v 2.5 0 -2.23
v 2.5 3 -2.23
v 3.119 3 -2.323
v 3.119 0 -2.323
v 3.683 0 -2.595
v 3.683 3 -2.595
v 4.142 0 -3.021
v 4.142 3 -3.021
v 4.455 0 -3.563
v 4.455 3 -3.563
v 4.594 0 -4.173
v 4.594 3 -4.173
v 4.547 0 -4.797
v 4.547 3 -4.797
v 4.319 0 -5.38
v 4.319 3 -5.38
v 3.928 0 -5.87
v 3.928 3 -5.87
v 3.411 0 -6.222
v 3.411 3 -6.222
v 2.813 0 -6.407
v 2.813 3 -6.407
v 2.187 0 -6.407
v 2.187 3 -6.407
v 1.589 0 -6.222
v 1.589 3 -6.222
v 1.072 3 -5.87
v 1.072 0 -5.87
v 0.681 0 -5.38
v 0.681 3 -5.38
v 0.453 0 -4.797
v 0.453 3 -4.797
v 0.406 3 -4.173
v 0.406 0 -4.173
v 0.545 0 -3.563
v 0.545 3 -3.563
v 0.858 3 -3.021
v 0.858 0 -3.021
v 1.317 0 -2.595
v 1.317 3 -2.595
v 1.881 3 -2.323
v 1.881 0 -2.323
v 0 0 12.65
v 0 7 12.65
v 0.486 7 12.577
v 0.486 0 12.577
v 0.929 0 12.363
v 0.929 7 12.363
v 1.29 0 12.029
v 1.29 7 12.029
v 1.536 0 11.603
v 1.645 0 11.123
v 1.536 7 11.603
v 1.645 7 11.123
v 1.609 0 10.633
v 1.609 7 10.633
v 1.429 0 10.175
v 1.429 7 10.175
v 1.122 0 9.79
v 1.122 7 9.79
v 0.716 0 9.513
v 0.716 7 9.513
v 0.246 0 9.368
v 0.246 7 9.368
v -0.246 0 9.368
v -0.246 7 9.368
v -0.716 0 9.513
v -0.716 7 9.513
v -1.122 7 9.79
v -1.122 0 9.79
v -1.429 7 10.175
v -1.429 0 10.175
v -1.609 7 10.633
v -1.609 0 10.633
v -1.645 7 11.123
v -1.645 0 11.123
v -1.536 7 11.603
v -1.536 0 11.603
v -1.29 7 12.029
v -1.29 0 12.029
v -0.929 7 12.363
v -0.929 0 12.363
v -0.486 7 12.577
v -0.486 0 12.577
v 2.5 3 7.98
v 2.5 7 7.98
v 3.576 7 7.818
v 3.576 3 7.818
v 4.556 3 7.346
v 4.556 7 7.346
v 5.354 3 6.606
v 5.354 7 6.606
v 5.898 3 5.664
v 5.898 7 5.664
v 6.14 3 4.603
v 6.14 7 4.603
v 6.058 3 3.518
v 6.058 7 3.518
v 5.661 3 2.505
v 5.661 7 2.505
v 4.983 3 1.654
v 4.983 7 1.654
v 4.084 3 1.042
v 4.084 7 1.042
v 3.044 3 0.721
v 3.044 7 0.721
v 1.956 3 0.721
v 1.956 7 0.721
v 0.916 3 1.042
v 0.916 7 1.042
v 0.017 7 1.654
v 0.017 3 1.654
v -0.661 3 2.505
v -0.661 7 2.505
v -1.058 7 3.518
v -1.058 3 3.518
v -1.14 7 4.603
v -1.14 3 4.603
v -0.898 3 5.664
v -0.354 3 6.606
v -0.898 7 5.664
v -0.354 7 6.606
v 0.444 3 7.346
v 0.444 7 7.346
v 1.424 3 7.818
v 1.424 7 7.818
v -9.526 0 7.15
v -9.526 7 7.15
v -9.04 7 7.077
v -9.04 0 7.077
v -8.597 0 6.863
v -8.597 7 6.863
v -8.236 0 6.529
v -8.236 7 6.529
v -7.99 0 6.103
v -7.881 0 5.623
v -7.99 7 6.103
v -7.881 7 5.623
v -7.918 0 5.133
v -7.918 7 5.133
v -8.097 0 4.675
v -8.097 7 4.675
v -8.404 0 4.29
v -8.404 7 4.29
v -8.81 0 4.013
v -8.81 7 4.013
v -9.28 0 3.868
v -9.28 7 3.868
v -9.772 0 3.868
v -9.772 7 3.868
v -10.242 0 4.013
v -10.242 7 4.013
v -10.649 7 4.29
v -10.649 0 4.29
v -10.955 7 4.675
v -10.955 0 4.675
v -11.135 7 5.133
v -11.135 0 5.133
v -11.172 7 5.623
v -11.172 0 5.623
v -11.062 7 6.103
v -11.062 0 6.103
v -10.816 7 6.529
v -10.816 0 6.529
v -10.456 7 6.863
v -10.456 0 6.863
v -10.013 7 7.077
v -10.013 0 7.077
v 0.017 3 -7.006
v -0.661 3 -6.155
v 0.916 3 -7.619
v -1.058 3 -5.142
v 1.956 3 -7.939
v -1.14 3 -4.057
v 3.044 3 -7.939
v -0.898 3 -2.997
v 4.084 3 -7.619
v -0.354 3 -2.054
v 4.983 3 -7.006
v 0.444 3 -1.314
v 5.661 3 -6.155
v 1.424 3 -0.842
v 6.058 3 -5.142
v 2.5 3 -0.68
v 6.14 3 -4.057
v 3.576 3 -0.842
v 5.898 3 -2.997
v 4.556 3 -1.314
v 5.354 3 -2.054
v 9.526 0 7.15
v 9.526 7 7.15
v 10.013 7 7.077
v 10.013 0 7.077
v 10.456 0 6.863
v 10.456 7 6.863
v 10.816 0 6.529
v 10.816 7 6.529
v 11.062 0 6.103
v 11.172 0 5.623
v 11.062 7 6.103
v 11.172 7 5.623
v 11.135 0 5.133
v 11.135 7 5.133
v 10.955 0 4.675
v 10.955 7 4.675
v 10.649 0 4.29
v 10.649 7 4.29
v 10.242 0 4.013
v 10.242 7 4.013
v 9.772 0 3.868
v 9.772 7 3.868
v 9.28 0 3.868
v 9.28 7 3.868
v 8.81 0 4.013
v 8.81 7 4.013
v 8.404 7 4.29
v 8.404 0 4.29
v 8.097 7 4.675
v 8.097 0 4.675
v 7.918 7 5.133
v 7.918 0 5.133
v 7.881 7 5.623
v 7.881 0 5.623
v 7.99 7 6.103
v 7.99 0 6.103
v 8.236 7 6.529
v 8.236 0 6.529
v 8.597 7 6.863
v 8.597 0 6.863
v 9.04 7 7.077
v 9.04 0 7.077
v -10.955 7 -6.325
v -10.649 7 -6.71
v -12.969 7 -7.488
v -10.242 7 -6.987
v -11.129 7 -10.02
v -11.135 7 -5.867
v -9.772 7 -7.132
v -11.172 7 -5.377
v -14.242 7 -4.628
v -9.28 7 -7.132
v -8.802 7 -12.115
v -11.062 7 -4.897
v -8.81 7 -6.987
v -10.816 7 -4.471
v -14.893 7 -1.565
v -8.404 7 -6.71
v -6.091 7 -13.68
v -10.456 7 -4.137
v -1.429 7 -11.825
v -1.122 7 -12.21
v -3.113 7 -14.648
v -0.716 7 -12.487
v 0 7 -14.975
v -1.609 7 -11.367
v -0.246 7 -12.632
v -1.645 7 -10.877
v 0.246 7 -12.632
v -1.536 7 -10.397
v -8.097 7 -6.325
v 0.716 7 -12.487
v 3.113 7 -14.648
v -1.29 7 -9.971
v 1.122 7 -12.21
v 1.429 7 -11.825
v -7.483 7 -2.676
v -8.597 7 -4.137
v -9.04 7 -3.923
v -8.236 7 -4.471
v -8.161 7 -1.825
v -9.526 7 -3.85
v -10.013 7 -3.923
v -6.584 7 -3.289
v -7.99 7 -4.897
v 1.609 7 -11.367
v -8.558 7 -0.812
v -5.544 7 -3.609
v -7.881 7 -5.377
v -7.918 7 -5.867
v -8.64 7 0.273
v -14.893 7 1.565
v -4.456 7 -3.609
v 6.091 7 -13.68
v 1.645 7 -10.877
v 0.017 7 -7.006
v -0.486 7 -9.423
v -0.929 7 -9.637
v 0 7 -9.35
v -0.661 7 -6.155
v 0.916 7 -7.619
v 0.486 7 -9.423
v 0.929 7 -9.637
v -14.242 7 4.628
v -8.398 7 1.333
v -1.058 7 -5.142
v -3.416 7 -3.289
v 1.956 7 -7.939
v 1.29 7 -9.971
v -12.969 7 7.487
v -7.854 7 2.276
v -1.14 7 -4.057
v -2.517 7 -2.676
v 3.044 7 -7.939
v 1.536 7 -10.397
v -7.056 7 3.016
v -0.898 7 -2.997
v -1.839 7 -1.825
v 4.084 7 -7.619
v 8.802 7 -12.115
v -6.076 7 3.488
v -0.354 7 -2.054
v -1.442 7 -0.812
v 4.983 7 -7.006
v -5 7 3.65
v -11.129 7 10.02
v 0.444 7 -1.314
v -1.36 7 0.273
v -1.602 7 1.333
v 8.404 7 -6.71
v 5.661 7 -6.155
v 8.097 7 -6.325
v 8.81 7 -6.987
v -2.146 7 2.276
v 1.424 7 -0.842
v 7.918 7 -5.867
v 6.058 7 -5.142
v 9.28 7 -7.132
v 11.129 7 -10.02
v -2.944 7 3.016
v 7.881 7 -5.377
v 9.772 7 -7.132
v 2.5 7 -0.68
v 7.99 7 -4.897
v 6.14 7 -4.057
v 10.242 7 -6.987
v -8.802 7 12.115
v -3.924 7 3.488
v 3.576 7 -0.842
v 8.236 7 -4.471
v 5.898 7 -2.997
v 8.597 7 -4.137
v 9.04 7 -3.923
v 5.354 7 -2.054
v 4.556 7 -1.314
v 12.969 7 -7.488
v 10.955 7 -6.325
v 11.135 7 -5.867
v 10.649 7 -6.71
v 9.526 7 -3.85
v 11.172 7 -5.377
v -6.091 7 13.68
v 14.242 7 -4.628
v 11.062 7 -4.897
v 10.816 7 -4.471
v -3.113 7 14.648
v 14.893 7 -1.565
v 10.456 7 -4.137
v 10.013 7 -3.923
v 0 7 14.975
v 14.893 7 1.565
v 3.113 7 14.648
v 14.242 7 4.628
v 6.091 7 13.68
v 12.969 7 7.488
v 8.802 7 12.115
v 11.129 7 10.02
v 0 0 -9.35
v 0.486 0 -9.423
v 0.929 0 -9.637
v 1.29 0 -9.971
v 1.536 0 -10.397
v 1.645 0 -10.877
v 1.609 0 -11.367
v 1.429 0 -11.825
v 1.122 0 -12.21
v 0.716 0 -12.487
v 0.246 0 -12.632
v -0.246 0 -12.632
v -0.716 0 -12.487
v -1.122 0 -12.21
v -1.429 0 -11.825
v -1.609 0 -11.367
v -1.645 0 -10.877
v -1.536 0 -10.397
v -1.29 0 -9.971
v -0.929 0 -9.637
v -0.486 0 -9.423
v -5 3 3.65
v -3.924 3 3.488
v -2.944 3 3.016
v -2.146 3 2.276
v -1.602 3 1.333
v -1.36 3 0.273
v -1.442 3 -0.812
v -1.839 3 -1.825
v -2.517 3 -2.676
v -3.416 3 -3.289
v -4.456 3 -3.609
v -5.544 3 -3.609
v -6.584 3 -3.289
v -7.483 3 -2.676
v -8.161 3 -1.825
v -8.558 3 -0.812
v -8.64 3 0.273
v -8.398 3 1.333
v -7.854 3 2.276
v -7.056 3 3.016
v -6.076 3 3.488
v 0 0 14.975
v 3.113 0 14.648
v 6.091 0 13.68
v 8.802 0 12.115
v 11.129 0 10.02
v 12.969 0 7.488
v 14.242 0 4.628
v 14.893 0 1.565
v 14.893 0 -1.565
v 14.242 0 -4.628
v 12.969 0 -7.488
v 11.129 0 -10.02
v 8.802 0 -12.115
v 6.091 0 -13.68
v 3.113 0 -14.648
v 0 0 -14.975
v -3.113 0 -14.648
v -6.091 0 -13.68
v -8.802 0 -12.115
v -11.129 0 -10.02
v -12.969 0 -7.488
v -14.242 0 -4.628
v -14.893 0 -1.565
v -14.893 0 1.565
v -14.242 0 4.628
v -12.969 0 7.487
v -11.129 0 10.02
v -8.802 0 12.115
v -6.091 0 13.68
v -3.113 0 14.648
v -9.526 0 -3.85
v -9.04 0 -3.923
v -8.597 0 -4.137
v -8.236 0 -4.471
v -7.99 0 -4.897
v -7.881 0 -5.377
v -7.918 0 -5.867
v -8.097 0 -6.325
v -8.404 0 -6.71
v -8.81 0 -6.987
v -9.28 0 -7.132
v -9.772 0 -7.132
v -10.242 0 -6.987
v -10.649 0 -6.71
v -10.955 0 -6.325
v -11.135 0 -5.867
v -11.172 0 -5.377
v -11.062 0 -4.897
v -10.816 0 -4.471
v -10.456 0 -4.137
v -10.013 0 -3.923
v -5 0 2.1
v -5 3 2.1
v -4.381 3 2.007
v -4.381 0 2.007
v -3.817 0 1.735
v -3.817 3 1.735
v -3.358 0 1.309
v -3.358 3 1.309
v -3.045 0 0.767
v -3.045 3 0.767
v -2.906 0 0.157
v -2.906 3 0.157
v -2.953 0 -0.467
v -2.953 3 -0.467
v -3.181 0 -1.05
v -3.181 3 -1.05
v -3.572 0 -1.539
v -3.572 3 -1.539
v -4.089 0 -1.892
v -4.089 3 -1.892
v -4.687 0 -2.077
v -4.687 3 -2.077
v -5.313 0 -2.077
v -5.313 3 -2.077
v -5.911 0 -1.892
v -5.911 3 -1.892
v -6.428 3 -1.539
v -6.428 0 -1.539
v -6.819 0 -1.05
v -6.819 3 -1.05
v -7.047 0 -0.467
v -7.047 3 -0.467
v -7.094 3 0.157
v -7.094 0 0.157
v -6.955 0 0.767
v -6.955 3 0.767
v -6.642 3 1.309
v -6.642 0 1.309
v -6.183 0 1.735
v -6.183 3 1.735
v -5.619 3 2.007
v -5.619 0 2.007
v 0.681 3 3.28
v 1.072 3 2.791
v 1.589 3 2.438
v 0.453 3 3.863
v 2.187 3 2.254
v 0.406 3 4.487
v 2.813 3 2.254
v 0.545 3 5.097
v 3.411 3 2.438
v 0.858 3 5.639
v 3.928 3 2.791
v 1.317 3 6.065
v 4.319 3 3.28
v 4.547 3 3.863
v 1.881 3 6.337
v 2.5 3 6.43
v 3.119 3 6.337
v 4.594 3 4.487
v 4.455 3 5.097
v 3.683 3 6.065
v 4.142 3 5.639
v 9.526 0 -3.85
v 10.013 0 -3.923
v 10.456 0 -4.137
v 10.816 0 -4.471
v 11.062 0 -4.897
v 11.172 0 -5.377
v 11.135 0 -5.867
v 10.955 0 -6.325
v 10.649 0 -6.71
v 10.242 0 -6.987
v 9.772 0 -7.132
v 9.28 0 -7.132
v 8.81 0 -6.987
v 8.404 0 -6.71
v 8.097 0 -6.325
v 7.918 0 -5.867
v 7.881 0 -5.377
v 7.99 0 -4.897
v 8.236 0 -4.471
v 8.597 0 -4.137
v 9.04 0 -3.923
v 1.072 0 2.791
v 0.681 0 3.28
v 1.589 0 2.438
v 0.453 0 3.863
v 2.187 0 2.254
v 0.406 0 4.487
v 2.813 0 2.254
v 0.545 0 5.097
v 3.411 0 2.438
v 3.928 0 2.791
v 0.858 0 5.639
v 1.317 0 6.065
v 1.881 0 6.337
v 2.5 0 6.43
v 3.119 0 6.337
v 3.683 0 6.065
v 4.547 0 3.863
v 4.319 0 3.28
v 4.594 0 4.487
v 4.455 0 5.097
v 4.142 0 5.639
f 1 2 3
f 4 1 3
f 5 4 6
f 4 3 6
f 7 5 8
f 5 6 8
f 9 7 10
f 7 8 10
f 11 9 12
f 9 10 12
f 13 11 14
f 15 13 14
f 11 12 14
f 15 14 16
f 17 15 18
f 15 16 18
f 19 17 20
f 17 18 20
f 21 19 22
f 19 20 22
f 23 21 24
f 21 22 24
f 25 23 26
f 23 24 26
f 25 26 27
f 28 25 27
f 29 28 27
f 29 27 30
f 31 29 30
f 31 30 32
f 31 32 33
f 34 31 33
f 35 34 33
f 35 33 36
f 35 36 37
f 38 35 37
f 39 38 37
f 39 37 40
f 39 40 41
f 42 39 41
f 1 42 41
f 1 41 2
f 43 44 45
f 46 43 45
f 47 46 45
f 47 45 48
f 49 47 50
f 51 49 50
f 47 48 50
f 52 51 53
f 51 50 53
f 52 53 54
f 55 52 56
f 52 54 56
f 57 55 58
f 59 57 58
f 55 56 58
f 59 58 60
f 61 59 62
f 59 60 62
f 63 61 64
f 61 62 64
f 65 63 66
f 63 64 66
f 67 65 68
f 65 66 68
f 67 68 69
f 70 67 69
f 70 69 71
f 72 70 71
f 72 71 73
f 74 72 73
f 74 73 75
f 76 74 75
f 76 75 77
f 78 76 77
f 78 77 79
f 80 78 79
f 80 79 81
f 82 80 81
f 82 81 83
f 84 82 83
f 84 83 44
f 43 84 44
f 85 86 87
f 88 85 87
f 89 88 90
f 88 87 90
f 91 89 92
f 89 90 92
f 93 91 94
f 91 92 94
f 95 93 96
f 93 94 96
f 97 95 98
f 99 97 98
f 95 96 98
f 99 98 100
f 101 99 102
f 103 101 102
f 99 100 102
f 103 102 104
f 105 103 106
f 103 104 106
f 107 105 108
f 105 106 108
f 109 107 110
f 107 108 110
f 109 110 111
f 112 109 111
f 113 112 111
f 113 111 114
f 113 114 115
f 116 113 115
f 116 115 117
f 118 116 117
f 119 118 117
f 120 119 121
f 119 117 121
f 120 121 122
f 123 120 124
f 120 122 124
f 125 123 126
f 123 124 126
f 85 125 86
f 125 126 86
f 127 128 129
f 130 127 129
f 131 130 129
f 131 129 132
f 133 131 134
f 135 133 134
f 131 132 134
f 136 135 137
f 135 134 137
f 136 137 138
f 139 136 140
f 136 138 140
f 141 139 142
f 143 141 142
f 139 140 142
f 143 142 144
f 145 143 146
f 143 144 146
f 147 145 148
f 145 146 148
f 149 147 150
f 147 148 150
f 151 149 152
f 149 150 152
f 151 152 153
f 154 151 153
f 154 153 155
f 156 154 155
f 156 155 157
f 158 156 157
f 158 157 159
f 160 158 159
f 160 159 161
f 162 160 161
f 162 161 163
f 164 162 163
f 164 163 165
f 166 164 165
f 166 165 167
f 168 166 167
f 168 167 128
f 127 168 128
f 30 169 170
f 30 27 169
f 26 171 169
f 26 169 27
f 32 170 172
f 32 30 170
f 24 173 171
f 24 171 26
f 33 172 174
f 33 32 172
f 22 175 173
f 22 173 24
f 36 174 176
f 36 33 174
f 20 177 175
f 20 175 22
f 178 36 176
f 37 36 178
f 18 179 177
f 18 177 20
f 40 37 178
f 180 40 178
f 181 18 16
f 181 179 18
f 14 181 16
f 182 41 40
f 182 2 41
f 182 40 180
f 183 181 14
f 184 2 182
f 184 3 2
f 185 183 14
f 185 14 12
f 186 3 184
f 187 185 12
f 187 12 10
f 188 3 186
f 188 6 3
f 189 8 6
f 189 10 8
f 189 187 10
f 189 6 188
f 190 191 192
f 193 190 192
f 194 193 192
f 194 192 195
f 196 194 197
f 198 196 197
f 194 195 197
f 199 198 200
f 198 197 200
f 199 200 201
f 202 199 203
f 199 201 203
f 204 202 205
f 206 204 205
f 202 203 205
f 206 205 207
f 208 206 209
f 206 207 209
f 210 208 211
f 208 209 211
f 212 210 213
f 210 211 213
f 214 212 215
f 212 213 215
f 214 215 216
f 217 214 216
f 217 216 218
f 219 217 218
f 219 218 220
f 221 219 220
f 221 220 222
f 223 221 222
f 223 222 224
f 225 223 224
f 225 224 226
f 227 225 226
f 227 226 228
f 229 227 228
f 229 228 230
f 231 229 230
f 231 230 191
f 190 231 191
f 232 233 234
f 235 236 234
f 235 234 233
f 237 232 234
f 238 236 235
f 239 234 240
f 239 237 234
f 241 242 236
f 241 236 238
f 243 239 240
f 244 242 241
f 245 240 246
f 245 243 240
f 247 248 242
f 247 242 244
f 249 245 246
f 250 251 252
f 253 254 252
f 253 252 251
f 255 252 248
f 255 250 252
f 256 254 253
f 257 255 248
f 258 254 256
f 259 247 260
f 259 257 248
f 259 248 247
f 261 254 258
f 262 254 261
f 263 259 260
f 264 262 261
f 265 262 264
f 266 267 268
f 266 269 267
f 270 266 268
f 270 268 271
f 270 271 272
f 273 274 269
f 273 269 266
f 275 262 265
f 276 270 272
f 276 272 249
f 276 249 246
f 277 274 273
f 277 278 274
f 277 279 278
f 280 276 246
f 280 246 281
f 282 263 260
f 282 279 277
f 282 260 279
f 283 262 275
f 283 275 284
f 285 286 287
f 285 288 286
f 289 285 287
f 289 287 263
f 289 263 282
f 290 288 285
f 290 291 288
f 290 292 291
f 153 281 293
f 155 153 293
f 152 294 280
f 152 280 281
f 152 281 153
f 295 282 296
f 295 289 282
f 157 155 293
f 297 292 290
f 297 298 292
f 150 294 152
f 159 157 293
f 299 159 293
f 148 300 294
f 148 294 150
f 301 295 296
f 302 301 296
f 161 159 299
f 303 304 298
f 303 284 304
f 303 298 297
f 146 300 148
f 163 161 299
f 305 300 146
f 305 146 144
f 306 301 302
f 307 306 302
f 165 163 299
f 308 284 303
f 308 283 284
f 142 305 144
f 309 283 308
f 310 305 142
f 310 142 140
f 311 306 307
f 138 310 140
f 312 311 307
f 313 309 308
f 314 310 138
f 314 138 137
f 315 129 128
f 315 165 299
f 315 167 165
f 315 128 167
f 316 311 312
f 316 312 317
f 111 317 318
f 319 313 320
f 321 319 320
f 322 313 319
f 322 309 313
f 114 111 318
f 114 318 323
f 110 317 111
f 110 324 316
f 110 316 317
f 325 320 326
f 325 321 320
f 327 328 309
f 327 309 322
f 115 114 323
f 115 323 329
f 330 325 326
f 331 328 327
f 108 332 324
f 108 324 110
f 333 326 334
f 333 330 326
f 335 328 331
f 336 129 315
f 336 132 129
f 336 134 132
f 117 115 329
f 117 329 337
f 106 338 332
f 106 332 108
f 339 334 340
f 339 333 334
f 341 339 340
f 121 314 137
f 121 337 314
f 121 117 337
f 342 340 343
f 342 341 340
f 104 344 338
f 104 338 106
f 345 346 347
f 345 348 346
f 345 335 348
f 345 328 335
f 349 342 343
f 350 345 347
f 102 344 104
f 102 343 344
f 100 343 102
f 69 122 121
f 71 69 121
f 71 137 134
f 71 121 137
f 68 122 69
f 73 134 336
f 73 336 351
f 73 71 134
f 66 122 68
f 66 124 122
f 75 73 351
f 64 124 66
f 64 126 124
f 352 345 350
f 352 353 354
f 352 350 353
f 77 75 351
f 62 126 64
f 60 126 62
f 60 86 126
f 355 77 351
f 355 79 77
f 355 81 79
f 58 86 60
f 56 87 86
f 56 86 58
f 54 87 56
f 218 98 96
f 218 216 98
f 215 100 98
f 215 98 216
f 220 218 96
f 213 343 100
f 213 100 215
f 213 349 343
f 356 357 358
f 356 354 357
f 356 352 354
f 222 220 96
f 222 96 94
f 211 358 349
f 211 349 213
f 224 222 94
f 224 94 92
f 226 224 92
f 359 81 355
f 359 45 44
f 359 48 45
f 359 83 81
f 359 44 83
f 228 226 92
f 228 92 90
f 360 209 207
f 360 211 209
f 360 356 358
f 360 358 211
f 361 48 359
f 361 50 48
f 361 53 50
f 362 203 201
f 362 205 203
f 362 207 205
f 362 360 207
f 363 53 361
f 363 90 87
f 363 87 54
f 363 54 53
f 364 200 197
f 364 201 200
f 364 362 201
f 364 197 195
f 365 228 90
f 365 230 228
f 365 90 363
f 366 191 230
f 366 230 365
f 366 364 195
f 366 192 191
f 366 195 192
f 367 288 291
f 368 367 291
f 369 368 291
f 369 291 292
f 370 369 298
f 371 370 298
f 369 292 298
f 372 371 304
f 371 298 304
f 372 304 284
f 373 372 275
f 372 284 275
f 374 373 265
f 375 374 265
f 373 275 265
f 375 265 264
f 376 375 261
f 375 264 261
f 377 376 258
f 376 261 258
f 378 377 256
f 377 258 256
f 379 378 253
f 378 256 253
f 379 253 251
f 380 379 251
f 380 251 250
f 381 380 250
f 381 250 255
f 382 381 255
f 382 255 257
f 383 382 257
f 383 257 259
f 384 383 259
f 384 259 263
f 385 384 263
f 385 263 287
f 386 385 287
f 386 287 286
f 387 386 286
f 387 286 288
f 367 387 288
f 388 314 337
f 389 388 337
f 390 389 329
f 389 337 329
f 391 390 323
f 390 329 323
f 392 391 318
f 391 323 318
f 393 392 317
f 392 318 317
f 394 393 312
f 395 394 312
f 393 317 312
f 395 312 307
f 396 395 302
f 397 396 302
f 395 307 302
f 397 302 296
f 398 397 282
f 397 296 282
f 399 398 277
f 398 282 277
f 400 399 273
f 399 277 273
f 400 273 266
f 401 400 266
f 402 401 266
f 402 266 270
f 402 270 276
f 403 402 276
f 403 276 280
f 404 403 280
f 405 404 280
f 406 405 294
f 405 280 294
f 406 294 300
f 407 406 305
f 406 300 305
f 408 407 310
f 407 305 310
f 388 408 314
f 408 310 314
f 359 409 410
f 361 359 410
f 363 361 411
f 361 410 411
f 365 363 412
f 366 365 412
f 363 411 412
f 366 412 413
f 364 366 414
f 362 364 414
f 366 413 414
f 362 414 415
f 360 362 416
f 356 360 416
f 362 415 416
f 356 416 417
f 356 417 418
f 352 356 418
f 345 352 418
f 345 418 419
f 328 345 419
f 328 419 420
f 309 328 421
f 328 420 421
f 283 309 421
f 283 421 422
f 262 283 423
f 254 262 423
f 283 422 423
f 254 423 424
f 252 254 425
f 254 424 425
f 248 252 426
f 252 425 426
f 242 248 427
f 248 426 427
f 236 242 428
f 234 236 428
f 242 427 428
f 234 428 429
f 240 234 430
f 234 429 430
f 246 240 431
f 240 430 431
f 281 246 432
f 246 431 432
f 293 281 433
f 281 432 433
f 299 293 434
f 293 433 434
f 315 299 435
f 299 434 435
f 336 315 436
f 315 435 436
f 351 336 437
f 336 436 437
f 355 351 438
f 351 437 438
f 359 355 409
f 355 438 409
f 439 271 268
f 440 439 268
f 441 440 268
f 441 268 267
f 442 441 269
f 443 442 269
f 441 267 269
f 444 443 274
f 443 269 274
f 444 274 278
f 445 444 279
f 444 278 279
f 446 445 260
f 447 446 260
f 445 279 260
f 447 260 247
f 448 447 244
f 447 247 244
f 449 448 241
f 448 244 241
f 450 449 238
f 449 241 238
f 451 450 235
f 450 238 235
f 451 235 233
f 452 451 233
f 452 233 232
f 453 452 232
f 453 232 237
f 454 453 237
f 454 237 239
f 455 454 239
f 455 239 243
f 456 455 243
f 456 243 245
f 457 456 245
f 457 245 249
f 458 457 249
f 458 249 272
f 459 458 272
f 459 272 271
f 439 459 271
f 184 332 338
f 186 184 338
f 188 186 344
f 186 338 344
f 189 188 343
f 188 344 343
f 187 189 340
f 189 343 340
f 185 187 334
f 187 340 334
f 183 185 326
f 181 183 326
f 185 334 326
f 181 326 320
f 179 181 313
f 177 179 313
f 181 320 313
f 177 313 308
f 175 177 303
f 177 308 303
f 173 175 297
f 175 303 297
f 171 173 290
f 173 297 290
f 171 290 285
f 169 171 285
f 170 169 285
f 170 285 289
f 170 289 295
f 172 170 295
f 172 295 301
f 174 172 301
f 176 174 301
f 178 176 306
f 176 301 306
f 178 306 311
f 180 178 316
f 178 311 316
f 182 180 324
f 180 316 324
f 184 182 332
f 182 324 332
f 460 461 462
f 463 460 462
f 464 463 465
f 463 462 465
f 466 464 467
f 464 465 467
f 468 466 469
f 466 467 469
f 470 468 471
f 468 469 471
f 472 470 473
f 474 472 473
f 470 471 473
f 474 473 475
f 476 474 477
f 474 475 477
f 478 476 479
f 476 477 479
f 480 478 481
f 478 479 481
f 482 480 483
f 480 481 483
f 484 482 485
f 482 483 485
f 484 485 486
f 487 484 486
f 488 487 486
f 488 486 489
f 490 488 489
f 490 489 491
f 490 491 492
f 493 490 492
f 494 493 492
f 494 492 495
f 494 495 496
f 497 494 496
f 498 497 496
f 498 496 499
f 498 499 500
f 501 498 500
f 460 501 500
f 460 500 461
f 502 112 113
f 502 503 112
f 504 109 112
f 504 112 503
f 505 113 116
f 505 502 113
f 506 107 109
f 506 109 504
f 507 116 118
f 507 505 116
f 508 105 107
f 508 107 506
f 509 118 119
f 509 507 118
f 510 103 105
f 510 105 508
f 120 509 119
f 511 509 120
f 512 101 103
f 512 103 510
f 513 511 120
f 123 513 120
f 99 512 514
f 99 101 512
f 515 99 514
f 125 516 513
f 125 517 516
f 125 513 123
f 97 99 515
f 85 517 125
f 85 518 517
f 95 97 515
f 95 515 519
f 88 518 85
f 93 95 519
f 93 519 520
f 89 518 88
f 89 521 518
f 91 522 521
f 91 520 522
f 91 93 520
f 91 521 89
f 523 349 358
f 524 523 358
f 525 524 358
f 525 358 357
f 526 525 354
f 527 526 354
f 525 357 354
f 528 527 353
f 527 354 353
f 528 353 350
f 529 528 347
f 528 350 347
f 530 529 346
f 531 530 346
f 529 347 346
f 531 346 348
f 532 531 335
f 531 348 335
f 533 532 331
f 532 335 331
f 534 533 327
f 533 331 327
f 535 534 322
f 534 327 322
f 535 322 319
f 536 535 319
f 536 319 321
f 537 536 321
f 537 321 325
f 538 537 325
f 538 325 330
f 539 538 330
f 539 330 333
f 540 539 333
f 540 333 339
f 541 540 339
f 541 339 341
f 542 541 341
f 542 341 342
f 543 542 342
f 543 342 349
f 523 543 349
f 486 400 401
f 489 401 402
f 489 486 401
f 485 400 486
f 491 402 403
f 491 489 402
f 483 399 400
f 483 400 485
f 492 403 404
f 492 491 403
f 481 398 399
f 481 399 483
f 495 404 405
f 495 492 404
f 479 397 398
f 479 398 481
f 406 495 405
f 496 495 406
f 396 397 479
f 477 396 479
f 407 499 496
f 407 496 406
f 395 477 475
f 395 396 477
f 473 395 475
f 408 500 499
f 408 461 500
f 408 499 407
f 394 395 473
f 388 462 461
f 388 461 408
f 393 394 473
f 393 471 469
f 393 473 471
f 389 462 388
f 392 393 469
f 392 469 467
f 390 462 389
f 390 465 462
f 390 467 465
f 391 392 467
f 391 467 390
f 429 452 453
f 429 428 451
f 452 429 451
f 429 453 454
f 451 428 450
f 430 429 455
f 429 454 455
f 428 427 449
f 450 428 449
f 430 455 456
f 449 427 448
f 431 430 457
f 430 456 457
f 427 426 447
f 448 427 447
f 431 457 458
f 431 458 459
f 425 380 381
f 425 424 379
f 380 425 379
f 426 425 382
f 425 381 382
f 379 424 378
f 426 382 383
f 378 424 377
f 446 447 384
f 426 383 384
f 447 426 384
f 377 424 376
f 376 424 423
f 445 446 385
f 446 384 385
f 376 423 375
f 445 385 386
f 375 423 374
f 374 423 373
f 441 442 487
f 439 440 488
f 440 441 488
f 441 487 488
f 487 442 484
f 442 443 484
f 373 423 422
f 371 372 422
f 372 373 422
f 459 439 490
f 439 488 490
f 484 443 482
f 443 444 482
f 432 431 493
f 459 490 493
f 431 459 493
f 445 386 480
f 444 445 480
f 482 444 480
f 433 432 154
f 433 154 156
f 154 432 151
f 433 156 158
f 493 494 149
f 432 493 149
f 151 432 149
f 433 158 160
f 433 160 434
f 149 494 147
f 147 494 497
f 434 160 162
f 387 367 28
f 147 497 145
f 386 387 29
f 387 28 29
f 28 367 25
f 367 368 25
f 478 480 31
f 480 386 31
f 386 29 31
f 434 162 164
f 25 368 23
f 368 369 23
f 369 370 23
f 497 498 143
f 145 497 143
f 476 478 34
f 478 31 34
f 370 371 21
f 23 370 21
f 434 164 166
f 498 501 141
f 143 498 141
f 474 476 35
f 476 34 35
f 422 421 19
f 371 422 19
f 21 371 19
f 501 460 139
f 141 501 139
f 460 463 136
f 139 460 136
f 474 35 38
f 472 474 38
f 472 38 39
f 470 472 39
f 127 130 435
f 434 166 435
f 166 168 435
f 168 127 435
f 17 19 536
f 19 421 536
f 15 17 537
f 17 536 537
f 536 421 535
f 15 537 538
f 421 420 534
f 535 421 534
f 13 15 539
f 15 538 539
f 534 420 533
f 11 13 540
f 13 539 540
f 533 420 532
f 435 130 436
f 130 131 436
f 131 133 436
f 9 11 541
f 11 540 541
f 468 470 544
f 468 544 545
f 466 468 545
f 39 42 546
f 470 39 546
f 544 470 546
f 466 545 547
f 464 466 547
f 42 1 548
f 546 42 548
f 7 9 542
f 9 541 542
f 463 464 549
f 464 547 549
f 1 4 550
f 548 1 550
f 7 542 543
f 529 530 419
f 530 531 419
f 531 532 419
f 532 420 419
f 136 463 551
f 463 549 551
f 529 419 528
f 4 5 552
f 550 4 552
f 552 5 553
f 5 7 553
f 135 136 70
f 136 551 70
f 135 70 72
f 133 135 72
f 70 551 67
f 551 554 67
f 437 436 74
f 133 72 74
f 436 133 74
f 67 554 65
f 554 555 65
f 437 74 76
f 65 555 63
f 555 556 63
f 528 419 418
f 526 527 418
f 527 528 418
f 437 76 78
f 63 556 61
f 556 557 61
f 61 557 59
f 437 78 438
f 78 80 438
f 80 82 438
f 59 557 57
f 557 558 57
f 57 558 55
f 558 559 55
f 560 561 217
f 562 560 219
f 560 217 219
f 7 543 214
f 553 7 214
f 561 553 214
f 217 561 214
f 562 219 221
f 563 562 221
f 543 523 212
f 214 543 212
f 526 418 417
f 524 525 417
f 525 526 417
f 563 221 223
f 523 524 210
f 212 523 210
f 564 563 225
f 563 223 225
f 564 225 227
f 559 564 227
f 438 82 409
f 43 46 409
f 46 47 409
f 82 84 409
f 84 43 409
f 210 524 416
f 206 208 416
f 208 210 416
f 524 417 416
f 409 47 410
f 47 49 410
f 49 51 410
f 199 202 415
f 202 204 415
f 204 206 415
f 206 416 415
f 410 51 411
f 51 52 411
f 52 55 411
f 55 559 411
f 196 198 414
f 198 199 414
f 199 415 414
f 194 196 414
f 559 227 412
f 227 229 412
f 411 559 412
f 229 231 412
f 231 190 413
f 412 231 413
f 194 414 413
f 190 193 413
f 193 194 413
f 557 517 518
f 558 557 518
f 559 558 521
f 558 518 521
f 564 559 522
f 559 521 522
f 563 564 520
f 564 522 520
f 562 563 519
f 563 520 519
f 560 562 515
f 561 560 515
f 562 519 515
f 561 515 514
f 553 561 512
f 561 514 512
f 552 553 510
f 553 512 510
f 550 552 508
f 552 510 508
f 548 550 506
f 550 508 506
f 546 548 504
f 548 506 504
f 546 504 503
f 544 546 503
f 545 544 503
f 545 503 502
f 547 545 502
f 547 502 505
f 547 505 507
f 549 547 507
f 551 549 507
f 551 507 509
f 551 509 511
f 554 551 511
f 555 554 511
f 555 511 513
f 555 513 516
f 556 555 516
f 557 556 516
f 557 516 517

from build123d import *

# Parameters (mm, degrees)
SKETCH_1_R          = 14.975
EXTRUDE_1_DEPTH     = 7
SKETCH_2_R          = 2.1
CUT_EXTRUDE_1_DEPTH = 10
SKETCH_3_R          = 1.65
CUT_EXTRUDE_2_DEPTH = 10
SKETCH_5_R          = 3.65
CUT_EXTRUDE_3_DEPTH = 4


with BuildPart() as part:
    # 草图1 → 凸台-拉伸1 (new body)
    with BuildSketch(Plane(origin=(0, 0, 0), x_dir=(1, 0, 0), z_dir=(0, 1, 0))):
        with Locations(Location((0, 0, 0), (0, 0, 270))):
            Circle(SKETCH_1_R)
    extrude(amount=EXTRUDE_1_DEPTH)

    # 草图2 → 切除-拉伸1 (cut)
    with BuildSketch(Plane(origin=(0, 7, 0), x_dir=(1, 0, 0), z_dir=(0, 1, 0))):
        with Locations(Location((-5, 0, 0), (0, 0, 270))):
            Circle(SKETCH_2_R)
        with Locations(Location((2.5, 4.330127019, 0), (0, 0, 270))):
            Circle(SKETCH_2_R)
        with Locations(Location((2.5, -4.330127019, 0), (0, 0, 270))):
            Circle(SKETCH_2_R)
    extrude(amount=-CUT_EXTRUDE_1_DEPTH, mode=Mode.SUBTRACT)

    # 草图3 → 切除-拉伸2 (cut)
    with BuildSketch(Plane(origin=(0, 7, 0), x_dir=(1, 0, 0), z_dir=(0, 1, 0))):
        with Locations(Location((0, 11, 0), (0, 0, 270))):
            Circle(SKETCH_3_R)
        with Locations(Location((9.526279442, 5.5, 0), (0, 0, 270))):
            Circle(SKETCH_3_R)
        with Locations(Location((9.526279442, -5.5, 0), (0, 0, 270))):
            Circle(SKETCH_3_R)
        with Locations(Location((0, -11, 0), (0, 0, 270))):
            Circle(SKETCH_3_R)
        with Locations(Location((-9.526279442, -5.5, 0), (0, 0, 270))):
            Circle(SKETCH_3_R)
        with Locations(Location((-9.526279442, 5.5, 0), (0, 0, 270))):
            Circle(SKETCH_3_R)
    extrude(amount=-CUT_EXTRUDE_2_DEPTH, mode=Mode.SUBTRACT)

    # 草图5 → 切除-拉伸3 (cut)
    with BuildSketch(Plane(origin=(0, 7, 0), x_dir=(1, 0, 0), z_dir=(0, 1, 0))):
        with Locations(Location((-5, 0, 0), (0, 0, 270))):
            Circle(SKETCH_5_R)
        with Locations(Location((2.5, 4.330127019, 0), (0, 0, 270))):
            Circle(SKETCH_5_R)
        with Locations(Location((2.5, -4.330127019, 0), (0, 0, 270))):
            Circle(SKETCH_5_R)
    extrude(amount=-CUT_EXTRUDE_3_DEPTH, mode=Mode.SUBTRACT)


solid = part.part
